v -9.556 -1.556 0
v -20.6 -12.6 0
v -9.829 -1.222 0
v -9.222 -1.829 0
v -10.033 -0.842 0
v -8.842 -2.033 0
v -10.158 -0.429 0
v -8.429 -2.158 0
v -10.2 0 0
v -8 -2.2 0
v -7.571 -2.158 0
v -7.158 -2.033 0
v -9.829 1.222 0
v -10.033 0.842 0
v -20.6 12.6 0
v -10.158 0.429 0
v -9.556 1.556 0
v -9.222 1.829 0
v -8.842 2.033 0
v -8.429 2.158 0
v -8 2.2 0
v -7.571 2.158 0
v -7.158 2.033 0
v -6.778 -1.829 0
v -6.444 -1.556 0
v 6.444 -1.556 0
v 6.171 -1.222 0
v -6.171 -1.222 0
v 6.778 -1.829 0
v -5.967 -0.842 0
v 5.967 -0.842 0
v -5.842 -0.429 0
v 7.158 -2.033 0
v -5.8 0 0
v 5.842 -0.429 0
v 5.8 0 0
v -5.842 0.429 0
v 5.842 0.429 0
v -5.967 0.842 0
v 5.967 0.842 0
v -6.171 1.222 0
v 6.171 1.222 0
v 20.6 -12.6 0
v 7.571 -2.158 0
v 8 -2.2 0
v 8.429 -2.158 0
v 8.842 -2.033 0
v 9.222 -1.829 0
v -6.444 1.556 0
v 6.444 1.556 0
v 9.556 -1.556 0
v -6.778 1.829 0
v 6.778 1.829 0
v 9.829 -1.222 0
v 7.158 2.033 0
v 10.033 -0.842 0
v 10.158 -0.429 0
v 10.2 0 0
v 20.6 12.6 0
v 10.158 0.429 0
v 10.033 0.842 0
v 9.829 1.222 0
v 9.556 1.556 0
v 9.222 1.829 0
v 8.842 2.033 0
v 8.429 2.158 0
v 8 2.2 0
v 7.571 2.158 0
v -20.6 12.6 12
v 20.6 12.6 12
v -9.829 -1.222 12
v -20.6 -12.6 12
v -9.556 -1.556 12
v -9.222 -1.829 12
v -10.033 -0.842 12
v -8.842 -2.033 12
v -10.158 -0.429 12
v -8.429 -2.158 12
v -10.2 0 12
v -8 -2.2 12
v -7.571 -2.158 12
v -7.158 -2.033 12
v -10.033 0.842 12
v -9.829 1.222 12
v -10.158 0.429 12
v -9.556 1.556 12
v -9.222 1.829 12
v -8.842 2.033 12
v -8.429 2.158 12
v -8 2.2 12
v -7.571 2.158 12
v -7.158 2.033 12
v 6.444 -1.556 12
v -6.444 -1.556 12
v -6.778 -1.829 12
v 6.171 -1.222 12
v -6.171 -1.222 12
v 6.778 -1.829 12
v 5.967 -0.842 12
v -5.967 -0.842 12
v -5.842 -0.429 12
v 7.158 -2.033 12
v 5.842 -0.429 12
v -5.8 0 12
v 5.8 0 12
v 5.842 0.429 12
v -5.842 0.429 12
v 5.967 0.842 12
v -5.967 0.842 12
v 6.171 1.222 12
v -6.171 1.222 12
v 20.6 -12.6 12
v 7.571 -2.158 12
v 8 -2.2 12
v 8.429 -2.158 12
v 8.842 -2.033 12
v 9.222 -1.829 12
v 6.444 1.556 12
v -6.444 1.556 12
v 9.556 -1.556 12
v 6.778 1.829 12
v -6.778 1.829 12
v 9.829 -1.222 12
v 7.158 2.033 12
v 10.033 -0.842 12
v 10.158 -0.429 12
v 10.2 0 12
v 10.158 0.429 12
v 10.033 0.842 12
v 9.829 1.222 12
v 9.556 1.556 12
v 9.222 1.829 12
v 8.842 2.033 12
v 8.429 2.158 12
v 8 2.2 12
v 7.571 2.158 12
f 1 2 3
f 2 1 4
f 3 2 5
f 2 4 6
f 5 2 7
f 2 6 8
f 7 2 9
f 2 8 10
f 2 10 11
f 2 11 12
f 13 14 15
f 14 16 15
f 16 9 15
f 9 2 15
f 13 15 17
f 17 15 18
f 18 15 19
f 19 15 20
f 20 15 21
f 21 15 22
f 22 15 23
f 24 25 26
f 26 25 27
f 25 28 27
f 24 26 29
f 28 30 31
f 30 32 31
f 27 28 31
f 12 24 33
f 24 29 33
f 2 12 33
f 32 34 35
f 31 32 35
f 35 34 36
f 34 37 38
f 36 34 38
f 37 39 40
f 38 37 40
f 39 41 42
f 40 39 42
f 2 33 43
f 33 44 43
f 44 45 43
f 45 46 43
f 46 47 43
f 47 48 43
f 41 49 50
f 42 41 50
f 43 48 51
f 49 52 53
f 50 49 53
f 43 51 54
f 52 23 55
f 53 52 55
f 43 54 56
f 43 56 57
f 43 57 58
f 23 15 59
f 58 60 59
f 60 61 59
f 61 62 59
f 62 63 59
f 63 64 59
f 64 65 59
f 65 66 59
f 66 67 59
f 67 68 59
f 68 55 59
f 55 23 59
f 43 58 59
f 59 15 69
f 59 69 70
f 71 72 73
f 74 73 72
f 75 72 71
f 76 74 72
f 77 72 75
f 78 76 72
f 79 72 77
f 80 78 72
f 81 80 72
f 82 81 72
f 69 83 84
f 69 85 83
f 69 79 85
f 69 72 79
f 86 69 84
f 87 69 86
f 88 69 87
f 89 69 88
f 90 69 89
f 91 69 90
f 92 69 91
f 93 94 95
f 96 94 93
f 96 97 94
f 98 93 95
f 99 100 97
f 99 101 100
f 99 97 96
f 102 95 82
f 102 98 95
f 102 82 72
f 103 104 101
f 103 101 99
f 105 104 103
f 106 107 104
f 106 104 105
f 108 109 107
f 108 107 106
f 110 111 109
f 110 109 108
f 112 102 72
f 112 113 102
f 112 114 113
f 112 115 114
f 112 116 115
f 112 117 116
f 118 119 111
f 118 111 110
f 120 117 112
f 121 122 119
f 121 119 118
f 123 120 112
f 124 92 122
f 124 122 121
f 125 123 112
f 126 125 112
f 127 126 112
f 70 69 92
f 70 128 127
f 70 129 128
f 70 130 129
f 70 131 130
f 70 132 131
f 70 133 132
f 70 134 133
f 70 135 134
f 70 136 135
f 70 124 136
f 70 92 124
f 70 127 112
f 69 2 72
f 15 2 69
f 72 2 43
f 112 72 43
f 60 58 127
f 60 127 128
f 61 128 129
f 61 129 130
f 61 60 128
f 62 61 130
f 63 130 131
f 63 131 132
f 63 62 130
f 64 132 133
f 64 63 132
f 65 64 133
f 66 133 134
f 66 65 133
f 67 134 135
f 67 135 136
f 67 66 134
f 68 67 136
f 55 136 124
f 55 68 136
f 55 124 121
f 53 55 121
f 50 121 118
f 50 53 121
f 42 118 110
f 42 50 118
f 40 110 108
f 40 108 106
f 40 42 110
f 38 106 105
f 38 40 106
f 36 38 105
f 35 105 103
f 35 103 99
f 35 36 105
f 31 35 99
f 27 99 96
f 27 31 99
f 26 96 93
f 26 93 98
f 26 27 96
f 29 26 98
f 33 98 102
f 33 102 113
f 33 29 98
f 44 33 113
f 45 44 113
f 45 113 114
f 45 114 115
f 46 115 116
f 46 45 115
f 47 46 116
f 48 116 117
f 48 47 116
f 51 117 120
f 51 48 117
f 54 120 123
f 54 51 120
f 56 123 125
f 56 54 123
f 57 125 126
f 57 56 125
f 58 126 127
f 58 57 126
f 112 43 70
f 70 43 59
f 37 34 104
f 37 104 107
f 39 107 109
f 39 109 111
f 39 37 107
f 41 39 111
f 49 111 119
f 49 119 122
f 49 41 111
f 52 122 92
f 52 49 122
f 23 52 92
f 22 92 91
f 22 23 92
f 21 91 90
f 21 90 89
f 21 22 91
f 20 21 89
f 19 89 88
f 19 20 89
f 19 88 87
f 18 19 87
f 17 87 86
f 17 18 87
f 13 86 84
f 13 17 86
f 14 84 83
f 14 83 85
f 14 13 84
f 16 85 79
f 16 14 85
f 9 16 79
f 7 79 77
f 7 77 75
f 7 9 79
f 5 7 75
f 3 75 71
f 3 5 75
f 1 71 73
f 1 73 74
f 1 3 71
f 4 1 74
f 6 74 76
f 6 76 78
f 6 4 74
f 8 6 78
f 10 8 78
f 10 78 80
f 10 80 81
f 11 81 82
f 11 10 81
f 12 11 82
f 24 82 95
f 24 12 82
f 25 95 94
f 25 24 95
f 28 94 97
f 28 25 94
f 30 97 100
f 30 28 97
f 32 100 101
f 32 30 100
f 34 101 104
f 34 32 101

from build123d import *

# Parameters (mm, degrees)
ESQUISSE1_W             = 41.2
ESQUISSE1_H             = 25.2
BOSS_EXTRU_1_DEPTH      = 12
ESQUISSE2_R             = 2.2
ENL_V_MAT_EXTRU_1_DEPTH = 12


with BuildPart() as part:
    # Esquisse1 → Boss.-Extru.1 (new body)
    with BuildSketch(Plane.XY):
        Rectangle(ESQUISSE1_W, ESQUISSE1_H)
    extrude(amount=BOSS_EXTRU_1_DEPTH)

    # Esquisse2 → Enlèv. mat.-Extru.1 (cut)
    with BuildSketch(Plane.XY):
        with Locations((8, 0)):
            Circle(ESQUISSE2_R)
        with Locations((-8, 0)):
            Circle(ESQUISSE2_R)
    extrude(amount=ENL_V_MAT_EXTRU_1_DEPTH, mode=Mode.SUBTRACT)


solid = part.part
